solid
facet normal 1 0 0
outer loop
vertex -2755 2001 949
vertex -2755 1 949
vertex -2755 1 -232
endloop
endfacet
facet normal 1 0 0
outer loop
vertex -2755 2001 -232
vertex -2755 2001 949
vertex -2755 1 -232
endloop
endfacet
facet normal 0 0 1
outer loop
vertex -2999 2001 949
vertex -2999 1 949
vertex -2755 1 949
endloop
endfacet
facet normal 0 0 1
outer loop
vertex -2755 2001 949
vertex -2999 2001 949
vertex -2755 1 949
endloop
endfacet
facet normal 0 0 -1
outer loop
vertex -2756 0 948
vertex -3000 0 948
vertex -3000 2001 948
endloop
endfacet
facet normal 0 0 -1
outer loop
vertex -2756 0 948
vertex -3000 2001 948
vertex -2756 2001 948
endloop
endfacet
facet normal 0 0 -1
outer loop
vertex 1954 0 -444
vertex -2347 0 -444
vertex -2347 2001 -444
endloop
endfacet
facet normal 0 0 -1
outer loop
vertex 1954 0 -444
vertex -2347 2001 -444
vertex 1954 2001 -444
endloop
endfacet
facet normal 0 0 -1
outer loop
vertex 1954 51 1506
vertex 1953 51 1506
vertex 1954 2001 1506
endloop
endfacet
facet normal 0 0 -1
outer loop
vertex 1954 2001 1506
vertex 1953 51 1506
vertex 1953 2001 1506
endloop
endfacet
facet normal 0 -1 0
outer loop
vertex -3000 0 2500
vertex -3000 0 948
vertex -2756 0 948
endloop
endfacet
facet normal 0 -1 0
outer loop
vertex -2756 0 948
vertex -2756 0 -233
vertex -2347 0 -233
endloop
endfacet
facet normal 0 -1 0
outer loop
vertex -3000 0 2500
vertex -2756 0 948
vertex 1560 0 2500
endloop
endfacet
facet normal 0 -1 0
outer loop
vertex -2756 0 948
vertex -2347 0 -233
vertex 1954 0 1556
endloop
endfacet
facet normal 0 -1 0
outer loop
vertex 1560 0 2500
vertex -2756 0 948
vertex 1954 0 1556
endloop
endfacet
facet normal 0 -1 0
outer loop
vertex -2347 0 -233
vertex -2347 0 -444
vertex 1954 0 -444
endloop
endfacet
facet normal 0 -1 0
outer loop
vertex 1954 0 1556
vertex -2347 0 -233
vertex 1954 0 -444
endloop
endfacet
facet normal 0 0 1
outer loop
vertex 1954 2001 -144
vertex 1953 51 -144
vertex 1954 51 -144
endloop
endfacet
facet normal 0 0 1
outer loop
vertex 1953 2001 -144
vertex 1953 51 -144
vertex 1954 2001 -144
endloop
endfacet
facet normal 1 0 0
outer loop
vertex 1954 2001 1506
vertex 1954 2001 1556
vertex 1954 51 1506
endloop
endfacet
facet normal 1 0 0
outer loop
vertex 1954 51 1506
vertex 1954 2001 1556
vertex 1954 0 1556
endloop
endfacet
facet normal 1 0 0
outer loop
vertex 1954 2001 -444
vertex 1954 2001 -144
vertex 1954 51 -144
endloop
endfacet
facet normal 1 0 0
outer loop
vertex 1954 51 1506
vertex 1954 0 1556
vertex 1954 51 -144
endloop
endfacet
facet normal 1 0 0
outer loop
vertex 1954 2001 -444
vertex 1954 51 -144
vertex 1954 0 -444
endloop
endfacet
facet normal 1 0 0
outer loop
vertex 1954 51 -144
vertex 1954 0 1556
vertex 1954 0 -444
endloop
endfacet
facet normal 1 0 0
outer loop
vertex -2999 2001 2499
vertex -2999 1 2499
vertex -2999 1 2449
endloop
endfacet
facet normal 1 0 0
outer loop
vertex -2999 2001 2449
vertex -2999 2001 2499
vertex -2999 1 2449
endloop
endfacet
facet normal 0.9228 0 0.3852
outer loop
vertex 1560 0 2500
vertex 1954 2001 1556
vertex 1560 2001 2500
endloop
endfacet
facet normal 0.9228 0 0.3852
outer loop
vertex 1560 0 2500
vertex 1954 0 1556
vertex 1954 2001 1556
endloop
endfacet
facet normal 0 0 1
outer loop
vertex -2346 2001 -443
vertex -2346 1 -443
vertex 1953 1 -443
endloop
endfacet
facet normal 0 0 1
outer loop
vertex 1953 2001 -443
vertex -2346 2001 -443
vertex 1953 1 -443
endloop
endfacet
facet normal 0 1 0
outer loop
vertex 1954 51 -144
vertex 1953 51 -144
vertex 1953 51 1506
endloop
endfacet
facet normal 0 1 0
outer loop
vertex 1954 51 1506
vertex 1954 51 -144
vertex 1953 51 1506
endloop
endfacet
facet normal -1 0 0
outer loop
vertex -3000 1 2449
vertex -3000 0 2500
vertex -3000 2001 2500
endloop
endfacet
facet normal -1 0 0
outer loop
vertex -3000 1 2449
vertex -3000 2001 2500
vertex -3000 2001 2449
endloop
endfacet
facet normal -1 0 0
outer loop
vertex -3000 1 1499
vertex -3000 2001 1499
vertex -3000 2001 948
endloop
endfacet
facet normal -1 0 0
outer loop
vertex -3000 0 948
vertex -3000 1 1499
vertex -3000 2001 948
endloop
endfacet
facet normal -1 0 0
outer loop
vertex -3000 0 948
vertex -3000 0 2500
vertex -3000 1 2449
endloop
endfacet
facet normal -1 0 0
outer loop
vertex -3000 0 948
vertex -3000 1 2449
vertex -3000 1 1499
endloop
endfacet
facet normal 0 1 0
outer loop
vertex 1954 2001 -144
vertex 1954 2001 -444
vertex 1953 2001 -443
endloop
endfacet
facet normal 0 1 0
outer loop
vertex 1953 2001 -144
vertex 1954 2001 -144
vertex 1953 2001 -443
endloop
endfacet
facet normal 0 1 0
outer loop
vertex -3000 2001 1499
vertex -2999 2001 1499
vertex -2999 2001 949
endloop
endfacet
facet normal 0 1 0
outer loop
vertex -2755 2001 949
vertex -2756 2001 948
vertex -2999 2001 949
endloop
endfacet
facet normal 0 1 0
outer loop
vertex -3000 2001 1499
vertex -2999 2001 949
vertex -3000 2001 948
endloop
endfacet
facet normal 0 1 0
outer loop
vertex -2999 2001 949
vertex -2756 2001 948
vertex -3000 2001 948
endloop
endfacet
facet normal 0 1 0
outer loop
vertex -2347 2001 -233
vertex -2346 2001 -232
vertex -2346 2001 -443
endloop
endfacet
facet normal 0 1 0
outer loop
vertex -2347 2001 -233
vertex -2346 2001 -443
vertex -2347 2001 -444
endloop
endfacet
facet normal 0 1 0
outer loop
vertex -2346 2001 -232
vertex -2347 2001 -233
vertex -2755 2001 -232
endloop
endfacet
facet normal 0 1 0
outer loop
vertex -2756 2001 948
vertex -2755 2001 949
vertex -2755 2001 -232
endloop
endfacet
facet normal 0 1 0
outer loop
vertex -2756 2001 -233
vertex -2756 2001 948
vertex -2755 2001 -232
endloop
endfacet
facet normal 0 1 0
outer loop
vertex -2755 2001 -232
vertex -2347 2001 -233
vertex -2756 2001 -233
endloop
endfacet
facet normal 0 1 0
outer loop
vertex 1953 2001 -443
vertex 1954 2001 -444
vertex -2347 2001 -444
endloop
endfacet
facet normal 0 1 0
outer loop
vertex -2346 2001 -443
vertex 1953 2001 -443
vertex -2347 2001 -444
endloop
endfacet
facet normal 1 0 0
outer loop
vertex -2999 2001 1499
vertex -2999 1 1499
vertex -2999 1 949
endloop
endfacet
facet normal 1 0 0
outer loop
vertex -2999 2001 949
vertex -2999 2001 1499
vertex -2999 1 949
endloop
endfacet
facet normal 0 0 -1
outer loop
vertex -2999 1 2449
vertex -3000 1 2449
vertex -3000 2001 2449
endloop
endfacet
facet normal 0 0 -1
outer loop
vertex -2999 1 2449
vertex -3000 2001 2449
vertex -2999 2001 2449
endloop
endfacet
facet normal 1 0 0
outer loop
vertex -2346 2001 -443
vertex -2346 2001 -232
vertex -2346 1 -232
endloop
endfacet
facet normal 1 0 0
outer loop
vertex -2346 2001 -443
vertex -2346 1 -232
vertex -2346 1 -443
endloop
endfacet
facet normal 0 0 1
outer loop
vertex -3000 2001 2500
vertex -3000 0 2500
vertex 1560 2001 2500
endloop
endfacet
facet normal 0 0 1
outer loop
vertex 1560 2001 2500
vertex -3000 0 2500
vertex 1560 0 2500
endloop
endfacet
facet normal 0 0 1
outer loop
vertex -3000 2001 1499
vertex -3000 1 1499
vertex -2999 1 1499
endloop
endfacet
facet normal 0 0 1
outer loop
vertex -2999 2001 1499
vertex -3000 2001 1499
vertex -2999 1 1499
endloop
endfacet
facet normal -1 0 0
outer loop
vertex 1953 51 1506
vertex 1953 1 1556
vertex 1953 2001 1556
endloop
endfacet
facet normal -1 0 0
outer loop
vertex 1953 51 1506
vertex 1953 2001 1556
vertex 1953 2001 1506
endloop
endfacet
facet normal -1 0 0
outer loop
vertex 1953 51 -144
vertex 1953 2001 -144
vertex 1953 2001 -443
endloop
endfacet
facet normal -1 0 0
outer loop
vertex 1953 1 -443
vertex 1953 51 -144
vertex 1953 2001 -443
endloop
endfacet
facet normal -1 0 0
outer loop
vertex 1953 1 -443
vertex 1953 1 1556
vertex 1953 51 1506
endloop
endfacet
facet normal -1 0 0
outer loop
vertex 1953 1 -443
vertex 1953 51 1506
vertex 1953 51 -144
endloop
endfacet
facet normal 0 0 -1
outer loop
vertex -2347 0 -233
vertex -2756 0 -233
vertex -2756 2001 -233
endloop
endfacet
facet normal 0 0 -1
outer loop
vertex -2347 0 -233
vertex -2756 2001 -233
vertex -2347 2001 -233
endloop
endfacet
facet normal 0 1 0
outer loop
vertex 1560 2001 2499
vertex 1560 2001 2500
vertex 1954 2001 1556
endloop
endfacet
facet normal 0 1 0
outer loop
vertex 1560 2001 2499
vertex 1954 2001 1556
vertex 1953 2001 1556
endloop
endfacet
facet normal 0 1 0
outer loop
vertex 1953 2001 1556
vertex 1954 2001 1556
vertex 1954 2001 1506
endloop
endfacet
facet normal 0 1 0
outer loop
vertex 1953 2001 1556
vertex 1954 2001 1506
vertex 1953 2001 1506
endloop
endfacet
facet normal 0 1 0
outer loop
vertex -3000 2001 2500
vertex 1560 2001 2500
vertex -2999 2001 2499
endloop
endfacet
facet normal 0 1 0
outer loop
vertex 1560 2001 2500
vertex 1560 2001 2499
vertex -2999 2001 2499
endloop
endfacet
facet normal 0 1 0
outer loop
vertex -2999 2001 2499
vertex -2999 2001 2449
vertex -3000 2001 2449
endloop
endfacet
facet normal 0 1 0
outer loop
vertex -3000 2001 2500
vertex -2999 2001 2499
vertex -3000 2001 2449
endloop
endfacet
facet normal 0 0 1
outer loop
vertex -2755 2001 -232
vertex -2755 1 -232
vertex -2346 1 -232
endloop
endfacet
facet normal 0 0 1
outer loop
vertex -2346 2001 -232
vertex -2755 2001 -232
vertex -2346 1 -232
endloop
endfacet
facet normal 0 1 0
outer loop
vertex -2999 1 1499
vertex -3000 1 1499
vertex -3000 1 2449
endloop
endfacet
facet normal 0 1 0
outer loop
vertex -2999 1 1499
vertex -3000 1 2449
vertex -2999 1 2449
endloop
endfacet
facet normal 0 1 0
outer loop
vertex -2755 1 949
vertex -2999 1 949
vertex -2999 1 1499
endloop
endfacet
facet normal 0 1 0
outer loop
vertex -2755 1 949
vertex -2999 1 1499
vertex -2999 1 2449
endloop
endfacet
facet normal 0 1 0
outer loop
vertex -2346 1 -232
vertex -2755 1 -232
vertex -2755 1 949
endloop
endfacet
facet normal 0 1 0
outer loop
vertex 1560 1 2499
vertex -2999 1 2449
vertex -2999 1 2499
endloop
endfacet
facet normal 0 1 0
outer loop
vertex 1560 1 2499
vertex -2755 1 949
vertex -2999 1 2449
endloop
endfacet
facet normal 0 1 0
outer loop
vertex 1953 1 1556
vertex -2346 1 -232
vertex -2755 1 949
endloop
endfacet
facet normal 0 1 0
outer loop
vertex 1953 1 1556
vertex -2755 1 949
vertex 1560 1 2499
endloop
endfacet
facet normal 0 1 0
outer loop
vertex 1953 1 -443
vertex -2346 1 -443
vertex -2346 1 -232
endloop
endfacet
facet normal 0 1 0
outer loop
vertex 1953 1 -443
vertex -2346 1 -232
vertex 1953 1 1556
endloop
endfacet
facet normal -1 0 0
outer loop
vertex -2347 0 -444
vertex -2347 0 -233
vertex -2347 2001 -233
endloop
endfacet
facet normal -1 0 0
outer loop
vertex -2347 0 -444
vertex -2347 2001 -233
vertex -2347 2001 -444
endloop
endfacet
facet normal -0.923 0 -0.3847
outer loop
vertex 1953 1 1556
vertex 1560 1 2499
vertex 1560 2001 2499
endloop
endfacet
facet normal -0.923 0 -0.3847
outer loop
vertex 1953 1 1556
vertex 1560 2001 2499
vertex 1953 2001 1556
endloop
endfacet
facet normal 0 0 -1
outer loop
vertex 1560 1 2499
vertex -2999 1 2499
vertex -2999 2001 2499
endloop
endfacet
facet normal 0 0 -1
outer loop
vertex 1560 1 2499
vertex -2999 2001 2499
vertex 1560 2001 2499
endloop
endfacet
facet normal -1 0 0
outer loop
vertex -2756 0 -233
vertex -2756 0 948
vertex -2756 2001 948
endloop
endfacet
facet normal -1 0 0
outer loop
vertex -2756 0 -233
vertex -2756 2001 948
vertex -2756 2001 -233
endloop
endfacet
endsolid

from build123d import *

# Parameters (mm, degrees)
SKETCH1_W            = 6000
SKETCH1_H            = 5000
BOSS_EXTRUDE1_DEPTH  = 1
SKETCH2_W            = 4560
SKETCH2_H            = 1
BOSS_EXTRUDE2_DEPTH  = 2000
SKETCH5_W            = 1
SKETCH5_H            = 50
BOSS_EXTRUDE5_DEPTH  = 2000
SKETCH6_W            = 1
SKETCH6_H            = 550
BOSS_EXTRUDE6_DEPTH  = 2000
SKETCH7_W            = 245
SKETCH7_H            = 1
BOSS_EXTRUDE9_DEPTH  = 2000
SKETCH8_W            = 1
SKETCH8_H            = 1180
BOSS_EXTRUDE10_DEPTH = 2000
SKETCH9_W            = 410
SKETCH9_H            = 1
BOSS_EXTRUDE11_DEPTH = 2000
SKETCH10_W           = 1
SKETCH10_H           = 210
BOSS_EXTRUDE12_DEPTH = 2000
SKETCH11_W           = 4300
SKETCH11_H           = 1
BOSS_EXTRUDE13_DEPTH = 2000
SKETCH12_W           = 1
SKETCH12_H           = 2000
BOSS_EXTRUDE14_DEPTH = 2000
BOSS_EXTRUDE16_DEPTH = 2000
SKETCH14_W           = 1650
SKETCH14_H           = 2000
CUT_EXTRUDE1_DEPTH   = 5898.983553724
CUT_EXTRUDE2_DEPTH   = 2000


with BuildPart() as part:
    # Sketch1 → Boss-Extrude1 (new body)
    with BuildSketch(Plane(origin=(0, 0, 0), x_dir=(1, 0, 0), z_dir=(0, 1, 0))):
        Rectangle(SKETCH1_W, SKETCH1_H)
    extrude(amount=BOSS_EXTRUDE1_DEPTH)

    # Sketch2 → Boss-Extrude2 (add)
    with BuildSketch(Plane(origin=(0, 1, 0), x_dir=(1, 0, 0), z_dir=(0, 1, 0))):
        with Locations((-720, -2499.5)):
            Rectangle(SKETCH2_W, SKETCH2_H)
    extrude(amount=BOSS_EXTRUDE2_DEPTH)

    # Sketch5 → Boss-Extrude5 (add)
    with BuildSketch(Plane(origin=(0, 1, 0), x_dir=(1, 0, 0), z_dir=(0, 1, 0))):
        with Locations((-2999.5, -2474)):
            Rectangle(SKETCH5_W, SKETCH5_H)
    extrude(amount=BOSS_EXTRUDE5_DEPTH)

    # Sketch6 → Boss-Extrude6 (add)
    with BuildSketch(Plane(origin=(0, 1, 0), x_dir=(1, 0, 0), z_dir=(0, 1, 0))):
        with Locations((-2999.5, -1224)):
            Rectangle(SKETCH6_W, SKETCH6_H)
    extrude(amount=BOSS_EXTRUDE6_DEPTH)

    # Sketch7 → Boss-Extrude9 (add)
    with BuildSketch(Plane(origin=(0, 1, 0), x_dir=(1, 0, 0), z_dir=(0, 1, 0))):
        with Locations((-2877.5, -948.5)):
            Rectangle(SKETCH7_W, SKETCH7_H)
    extrude(amount=BOSS_EXTRUDE9_DEPTH)

    # Sketch8 → Boss-Extrude10 (add)
    with BuildSketch(Plane(origin=(0, 1, 0), x_dir=(1, 0, 0), z_dir=(0, 1, 0))):
        with Locations((-2755.5, -358)):
            Rectangle(SKETCH8_W, SKETCH8_H)
    extrude(amount=BOSS_EXTRUDE10_DEPTH)

    # Sketch9 → Boss-Extrude11 (add)
    with BuildSketch(Plane(origin=(0, 1, 0), x_dir=(1, 0, 0), z_dir=(0, 1, 0))):
        with Locations((-2551, 232.5)):
            Rectangle(SKETCH9_W, SKETCH9_H)
    extrude(amount=BOSS_EXTRUDE11_DEPTH)

    # Sketch10 → Boss-Extrude12 (add)
    with BuildSketch(Plane(origin=(0, 1, 0), x_dir=(1, 0, 0), z_dir=(0, 1, 0))):
        with Locations((-2346.5, 338)):
            Rectangle(SKETCH10_W, SKETCH10_H)
    extrude(amount=BOSS_EXTRUDE12_DEPTH)

    # Sketch11 → Boss-Extrude13 (add)
    with BuildSketch(Plane(origin=(0, 1, 0), x_dir=(1, 0, 0), z_dir=(0, 1, 0))):
        with Locations((-197, 443.5)):
            Rectangle(SKETCH11_W, SKETCH11_H)
    extrude(amount=BOSS_EXTRUDE13_DEPTH)

    # Sketch12 → Boss-Extrude14 (add)
    with BuildSketch(Plane(origin=(0, 1, 0), x_dir=(1, 0, 0), z_dir=(0, 1, 0))):
        with Locations((1953.5, -556)):
            Rectangle(SKETCH12_W, SKETCH12_H)
    extrude(amount=BOSS_EXTRUDE14_DEPTH)

    # Sketch13 → Boss-Extrude16 (add)
    with BuildSketch(Plane(origin=(0, 1, 0), x_dir=(1, 0, 0), z_dir=(0, 1, 0))):
        Polygon((1954, -1556), (1560, -2500), (1560, -2499), (1953, -1556), align=None)
    extrude(amount=BOSS_EXTRUDE16_DEPTH)

    # Sketch14 → Cut-Extrude1 (cut, through all)
    with BuildSketch(Plane.ZY.offset(-1953)):
        with Locations((681, 1051)):
            Rectangle(SKETCH14_W, SKETCH14_H)
    extrude(amount=-CUT_EXTRUDE1_DEPTH, mode=Mode.SUBTRACT)

    # Sketch15 → Cut-Extrude2 (cut)
    with BuildSketch(Plane(origin=(0, 1, 0), x_dir=(1, 0, 0), z_dir=(0, 1, 0))):
        Polygon((1560, -2500), (1954, -1556), (1954, 444), (-2347, 444), (-2347, 233), (-2756, 233), (-2756, -948), (-3000, -948), (-3000, 2500), (3000, 2500), (3000, -2500), align=None)
    extrude(amount=-CUT_EXTRUDE2_DEPTH, mode=Mode.SUBTRACT)


solid = part.part
